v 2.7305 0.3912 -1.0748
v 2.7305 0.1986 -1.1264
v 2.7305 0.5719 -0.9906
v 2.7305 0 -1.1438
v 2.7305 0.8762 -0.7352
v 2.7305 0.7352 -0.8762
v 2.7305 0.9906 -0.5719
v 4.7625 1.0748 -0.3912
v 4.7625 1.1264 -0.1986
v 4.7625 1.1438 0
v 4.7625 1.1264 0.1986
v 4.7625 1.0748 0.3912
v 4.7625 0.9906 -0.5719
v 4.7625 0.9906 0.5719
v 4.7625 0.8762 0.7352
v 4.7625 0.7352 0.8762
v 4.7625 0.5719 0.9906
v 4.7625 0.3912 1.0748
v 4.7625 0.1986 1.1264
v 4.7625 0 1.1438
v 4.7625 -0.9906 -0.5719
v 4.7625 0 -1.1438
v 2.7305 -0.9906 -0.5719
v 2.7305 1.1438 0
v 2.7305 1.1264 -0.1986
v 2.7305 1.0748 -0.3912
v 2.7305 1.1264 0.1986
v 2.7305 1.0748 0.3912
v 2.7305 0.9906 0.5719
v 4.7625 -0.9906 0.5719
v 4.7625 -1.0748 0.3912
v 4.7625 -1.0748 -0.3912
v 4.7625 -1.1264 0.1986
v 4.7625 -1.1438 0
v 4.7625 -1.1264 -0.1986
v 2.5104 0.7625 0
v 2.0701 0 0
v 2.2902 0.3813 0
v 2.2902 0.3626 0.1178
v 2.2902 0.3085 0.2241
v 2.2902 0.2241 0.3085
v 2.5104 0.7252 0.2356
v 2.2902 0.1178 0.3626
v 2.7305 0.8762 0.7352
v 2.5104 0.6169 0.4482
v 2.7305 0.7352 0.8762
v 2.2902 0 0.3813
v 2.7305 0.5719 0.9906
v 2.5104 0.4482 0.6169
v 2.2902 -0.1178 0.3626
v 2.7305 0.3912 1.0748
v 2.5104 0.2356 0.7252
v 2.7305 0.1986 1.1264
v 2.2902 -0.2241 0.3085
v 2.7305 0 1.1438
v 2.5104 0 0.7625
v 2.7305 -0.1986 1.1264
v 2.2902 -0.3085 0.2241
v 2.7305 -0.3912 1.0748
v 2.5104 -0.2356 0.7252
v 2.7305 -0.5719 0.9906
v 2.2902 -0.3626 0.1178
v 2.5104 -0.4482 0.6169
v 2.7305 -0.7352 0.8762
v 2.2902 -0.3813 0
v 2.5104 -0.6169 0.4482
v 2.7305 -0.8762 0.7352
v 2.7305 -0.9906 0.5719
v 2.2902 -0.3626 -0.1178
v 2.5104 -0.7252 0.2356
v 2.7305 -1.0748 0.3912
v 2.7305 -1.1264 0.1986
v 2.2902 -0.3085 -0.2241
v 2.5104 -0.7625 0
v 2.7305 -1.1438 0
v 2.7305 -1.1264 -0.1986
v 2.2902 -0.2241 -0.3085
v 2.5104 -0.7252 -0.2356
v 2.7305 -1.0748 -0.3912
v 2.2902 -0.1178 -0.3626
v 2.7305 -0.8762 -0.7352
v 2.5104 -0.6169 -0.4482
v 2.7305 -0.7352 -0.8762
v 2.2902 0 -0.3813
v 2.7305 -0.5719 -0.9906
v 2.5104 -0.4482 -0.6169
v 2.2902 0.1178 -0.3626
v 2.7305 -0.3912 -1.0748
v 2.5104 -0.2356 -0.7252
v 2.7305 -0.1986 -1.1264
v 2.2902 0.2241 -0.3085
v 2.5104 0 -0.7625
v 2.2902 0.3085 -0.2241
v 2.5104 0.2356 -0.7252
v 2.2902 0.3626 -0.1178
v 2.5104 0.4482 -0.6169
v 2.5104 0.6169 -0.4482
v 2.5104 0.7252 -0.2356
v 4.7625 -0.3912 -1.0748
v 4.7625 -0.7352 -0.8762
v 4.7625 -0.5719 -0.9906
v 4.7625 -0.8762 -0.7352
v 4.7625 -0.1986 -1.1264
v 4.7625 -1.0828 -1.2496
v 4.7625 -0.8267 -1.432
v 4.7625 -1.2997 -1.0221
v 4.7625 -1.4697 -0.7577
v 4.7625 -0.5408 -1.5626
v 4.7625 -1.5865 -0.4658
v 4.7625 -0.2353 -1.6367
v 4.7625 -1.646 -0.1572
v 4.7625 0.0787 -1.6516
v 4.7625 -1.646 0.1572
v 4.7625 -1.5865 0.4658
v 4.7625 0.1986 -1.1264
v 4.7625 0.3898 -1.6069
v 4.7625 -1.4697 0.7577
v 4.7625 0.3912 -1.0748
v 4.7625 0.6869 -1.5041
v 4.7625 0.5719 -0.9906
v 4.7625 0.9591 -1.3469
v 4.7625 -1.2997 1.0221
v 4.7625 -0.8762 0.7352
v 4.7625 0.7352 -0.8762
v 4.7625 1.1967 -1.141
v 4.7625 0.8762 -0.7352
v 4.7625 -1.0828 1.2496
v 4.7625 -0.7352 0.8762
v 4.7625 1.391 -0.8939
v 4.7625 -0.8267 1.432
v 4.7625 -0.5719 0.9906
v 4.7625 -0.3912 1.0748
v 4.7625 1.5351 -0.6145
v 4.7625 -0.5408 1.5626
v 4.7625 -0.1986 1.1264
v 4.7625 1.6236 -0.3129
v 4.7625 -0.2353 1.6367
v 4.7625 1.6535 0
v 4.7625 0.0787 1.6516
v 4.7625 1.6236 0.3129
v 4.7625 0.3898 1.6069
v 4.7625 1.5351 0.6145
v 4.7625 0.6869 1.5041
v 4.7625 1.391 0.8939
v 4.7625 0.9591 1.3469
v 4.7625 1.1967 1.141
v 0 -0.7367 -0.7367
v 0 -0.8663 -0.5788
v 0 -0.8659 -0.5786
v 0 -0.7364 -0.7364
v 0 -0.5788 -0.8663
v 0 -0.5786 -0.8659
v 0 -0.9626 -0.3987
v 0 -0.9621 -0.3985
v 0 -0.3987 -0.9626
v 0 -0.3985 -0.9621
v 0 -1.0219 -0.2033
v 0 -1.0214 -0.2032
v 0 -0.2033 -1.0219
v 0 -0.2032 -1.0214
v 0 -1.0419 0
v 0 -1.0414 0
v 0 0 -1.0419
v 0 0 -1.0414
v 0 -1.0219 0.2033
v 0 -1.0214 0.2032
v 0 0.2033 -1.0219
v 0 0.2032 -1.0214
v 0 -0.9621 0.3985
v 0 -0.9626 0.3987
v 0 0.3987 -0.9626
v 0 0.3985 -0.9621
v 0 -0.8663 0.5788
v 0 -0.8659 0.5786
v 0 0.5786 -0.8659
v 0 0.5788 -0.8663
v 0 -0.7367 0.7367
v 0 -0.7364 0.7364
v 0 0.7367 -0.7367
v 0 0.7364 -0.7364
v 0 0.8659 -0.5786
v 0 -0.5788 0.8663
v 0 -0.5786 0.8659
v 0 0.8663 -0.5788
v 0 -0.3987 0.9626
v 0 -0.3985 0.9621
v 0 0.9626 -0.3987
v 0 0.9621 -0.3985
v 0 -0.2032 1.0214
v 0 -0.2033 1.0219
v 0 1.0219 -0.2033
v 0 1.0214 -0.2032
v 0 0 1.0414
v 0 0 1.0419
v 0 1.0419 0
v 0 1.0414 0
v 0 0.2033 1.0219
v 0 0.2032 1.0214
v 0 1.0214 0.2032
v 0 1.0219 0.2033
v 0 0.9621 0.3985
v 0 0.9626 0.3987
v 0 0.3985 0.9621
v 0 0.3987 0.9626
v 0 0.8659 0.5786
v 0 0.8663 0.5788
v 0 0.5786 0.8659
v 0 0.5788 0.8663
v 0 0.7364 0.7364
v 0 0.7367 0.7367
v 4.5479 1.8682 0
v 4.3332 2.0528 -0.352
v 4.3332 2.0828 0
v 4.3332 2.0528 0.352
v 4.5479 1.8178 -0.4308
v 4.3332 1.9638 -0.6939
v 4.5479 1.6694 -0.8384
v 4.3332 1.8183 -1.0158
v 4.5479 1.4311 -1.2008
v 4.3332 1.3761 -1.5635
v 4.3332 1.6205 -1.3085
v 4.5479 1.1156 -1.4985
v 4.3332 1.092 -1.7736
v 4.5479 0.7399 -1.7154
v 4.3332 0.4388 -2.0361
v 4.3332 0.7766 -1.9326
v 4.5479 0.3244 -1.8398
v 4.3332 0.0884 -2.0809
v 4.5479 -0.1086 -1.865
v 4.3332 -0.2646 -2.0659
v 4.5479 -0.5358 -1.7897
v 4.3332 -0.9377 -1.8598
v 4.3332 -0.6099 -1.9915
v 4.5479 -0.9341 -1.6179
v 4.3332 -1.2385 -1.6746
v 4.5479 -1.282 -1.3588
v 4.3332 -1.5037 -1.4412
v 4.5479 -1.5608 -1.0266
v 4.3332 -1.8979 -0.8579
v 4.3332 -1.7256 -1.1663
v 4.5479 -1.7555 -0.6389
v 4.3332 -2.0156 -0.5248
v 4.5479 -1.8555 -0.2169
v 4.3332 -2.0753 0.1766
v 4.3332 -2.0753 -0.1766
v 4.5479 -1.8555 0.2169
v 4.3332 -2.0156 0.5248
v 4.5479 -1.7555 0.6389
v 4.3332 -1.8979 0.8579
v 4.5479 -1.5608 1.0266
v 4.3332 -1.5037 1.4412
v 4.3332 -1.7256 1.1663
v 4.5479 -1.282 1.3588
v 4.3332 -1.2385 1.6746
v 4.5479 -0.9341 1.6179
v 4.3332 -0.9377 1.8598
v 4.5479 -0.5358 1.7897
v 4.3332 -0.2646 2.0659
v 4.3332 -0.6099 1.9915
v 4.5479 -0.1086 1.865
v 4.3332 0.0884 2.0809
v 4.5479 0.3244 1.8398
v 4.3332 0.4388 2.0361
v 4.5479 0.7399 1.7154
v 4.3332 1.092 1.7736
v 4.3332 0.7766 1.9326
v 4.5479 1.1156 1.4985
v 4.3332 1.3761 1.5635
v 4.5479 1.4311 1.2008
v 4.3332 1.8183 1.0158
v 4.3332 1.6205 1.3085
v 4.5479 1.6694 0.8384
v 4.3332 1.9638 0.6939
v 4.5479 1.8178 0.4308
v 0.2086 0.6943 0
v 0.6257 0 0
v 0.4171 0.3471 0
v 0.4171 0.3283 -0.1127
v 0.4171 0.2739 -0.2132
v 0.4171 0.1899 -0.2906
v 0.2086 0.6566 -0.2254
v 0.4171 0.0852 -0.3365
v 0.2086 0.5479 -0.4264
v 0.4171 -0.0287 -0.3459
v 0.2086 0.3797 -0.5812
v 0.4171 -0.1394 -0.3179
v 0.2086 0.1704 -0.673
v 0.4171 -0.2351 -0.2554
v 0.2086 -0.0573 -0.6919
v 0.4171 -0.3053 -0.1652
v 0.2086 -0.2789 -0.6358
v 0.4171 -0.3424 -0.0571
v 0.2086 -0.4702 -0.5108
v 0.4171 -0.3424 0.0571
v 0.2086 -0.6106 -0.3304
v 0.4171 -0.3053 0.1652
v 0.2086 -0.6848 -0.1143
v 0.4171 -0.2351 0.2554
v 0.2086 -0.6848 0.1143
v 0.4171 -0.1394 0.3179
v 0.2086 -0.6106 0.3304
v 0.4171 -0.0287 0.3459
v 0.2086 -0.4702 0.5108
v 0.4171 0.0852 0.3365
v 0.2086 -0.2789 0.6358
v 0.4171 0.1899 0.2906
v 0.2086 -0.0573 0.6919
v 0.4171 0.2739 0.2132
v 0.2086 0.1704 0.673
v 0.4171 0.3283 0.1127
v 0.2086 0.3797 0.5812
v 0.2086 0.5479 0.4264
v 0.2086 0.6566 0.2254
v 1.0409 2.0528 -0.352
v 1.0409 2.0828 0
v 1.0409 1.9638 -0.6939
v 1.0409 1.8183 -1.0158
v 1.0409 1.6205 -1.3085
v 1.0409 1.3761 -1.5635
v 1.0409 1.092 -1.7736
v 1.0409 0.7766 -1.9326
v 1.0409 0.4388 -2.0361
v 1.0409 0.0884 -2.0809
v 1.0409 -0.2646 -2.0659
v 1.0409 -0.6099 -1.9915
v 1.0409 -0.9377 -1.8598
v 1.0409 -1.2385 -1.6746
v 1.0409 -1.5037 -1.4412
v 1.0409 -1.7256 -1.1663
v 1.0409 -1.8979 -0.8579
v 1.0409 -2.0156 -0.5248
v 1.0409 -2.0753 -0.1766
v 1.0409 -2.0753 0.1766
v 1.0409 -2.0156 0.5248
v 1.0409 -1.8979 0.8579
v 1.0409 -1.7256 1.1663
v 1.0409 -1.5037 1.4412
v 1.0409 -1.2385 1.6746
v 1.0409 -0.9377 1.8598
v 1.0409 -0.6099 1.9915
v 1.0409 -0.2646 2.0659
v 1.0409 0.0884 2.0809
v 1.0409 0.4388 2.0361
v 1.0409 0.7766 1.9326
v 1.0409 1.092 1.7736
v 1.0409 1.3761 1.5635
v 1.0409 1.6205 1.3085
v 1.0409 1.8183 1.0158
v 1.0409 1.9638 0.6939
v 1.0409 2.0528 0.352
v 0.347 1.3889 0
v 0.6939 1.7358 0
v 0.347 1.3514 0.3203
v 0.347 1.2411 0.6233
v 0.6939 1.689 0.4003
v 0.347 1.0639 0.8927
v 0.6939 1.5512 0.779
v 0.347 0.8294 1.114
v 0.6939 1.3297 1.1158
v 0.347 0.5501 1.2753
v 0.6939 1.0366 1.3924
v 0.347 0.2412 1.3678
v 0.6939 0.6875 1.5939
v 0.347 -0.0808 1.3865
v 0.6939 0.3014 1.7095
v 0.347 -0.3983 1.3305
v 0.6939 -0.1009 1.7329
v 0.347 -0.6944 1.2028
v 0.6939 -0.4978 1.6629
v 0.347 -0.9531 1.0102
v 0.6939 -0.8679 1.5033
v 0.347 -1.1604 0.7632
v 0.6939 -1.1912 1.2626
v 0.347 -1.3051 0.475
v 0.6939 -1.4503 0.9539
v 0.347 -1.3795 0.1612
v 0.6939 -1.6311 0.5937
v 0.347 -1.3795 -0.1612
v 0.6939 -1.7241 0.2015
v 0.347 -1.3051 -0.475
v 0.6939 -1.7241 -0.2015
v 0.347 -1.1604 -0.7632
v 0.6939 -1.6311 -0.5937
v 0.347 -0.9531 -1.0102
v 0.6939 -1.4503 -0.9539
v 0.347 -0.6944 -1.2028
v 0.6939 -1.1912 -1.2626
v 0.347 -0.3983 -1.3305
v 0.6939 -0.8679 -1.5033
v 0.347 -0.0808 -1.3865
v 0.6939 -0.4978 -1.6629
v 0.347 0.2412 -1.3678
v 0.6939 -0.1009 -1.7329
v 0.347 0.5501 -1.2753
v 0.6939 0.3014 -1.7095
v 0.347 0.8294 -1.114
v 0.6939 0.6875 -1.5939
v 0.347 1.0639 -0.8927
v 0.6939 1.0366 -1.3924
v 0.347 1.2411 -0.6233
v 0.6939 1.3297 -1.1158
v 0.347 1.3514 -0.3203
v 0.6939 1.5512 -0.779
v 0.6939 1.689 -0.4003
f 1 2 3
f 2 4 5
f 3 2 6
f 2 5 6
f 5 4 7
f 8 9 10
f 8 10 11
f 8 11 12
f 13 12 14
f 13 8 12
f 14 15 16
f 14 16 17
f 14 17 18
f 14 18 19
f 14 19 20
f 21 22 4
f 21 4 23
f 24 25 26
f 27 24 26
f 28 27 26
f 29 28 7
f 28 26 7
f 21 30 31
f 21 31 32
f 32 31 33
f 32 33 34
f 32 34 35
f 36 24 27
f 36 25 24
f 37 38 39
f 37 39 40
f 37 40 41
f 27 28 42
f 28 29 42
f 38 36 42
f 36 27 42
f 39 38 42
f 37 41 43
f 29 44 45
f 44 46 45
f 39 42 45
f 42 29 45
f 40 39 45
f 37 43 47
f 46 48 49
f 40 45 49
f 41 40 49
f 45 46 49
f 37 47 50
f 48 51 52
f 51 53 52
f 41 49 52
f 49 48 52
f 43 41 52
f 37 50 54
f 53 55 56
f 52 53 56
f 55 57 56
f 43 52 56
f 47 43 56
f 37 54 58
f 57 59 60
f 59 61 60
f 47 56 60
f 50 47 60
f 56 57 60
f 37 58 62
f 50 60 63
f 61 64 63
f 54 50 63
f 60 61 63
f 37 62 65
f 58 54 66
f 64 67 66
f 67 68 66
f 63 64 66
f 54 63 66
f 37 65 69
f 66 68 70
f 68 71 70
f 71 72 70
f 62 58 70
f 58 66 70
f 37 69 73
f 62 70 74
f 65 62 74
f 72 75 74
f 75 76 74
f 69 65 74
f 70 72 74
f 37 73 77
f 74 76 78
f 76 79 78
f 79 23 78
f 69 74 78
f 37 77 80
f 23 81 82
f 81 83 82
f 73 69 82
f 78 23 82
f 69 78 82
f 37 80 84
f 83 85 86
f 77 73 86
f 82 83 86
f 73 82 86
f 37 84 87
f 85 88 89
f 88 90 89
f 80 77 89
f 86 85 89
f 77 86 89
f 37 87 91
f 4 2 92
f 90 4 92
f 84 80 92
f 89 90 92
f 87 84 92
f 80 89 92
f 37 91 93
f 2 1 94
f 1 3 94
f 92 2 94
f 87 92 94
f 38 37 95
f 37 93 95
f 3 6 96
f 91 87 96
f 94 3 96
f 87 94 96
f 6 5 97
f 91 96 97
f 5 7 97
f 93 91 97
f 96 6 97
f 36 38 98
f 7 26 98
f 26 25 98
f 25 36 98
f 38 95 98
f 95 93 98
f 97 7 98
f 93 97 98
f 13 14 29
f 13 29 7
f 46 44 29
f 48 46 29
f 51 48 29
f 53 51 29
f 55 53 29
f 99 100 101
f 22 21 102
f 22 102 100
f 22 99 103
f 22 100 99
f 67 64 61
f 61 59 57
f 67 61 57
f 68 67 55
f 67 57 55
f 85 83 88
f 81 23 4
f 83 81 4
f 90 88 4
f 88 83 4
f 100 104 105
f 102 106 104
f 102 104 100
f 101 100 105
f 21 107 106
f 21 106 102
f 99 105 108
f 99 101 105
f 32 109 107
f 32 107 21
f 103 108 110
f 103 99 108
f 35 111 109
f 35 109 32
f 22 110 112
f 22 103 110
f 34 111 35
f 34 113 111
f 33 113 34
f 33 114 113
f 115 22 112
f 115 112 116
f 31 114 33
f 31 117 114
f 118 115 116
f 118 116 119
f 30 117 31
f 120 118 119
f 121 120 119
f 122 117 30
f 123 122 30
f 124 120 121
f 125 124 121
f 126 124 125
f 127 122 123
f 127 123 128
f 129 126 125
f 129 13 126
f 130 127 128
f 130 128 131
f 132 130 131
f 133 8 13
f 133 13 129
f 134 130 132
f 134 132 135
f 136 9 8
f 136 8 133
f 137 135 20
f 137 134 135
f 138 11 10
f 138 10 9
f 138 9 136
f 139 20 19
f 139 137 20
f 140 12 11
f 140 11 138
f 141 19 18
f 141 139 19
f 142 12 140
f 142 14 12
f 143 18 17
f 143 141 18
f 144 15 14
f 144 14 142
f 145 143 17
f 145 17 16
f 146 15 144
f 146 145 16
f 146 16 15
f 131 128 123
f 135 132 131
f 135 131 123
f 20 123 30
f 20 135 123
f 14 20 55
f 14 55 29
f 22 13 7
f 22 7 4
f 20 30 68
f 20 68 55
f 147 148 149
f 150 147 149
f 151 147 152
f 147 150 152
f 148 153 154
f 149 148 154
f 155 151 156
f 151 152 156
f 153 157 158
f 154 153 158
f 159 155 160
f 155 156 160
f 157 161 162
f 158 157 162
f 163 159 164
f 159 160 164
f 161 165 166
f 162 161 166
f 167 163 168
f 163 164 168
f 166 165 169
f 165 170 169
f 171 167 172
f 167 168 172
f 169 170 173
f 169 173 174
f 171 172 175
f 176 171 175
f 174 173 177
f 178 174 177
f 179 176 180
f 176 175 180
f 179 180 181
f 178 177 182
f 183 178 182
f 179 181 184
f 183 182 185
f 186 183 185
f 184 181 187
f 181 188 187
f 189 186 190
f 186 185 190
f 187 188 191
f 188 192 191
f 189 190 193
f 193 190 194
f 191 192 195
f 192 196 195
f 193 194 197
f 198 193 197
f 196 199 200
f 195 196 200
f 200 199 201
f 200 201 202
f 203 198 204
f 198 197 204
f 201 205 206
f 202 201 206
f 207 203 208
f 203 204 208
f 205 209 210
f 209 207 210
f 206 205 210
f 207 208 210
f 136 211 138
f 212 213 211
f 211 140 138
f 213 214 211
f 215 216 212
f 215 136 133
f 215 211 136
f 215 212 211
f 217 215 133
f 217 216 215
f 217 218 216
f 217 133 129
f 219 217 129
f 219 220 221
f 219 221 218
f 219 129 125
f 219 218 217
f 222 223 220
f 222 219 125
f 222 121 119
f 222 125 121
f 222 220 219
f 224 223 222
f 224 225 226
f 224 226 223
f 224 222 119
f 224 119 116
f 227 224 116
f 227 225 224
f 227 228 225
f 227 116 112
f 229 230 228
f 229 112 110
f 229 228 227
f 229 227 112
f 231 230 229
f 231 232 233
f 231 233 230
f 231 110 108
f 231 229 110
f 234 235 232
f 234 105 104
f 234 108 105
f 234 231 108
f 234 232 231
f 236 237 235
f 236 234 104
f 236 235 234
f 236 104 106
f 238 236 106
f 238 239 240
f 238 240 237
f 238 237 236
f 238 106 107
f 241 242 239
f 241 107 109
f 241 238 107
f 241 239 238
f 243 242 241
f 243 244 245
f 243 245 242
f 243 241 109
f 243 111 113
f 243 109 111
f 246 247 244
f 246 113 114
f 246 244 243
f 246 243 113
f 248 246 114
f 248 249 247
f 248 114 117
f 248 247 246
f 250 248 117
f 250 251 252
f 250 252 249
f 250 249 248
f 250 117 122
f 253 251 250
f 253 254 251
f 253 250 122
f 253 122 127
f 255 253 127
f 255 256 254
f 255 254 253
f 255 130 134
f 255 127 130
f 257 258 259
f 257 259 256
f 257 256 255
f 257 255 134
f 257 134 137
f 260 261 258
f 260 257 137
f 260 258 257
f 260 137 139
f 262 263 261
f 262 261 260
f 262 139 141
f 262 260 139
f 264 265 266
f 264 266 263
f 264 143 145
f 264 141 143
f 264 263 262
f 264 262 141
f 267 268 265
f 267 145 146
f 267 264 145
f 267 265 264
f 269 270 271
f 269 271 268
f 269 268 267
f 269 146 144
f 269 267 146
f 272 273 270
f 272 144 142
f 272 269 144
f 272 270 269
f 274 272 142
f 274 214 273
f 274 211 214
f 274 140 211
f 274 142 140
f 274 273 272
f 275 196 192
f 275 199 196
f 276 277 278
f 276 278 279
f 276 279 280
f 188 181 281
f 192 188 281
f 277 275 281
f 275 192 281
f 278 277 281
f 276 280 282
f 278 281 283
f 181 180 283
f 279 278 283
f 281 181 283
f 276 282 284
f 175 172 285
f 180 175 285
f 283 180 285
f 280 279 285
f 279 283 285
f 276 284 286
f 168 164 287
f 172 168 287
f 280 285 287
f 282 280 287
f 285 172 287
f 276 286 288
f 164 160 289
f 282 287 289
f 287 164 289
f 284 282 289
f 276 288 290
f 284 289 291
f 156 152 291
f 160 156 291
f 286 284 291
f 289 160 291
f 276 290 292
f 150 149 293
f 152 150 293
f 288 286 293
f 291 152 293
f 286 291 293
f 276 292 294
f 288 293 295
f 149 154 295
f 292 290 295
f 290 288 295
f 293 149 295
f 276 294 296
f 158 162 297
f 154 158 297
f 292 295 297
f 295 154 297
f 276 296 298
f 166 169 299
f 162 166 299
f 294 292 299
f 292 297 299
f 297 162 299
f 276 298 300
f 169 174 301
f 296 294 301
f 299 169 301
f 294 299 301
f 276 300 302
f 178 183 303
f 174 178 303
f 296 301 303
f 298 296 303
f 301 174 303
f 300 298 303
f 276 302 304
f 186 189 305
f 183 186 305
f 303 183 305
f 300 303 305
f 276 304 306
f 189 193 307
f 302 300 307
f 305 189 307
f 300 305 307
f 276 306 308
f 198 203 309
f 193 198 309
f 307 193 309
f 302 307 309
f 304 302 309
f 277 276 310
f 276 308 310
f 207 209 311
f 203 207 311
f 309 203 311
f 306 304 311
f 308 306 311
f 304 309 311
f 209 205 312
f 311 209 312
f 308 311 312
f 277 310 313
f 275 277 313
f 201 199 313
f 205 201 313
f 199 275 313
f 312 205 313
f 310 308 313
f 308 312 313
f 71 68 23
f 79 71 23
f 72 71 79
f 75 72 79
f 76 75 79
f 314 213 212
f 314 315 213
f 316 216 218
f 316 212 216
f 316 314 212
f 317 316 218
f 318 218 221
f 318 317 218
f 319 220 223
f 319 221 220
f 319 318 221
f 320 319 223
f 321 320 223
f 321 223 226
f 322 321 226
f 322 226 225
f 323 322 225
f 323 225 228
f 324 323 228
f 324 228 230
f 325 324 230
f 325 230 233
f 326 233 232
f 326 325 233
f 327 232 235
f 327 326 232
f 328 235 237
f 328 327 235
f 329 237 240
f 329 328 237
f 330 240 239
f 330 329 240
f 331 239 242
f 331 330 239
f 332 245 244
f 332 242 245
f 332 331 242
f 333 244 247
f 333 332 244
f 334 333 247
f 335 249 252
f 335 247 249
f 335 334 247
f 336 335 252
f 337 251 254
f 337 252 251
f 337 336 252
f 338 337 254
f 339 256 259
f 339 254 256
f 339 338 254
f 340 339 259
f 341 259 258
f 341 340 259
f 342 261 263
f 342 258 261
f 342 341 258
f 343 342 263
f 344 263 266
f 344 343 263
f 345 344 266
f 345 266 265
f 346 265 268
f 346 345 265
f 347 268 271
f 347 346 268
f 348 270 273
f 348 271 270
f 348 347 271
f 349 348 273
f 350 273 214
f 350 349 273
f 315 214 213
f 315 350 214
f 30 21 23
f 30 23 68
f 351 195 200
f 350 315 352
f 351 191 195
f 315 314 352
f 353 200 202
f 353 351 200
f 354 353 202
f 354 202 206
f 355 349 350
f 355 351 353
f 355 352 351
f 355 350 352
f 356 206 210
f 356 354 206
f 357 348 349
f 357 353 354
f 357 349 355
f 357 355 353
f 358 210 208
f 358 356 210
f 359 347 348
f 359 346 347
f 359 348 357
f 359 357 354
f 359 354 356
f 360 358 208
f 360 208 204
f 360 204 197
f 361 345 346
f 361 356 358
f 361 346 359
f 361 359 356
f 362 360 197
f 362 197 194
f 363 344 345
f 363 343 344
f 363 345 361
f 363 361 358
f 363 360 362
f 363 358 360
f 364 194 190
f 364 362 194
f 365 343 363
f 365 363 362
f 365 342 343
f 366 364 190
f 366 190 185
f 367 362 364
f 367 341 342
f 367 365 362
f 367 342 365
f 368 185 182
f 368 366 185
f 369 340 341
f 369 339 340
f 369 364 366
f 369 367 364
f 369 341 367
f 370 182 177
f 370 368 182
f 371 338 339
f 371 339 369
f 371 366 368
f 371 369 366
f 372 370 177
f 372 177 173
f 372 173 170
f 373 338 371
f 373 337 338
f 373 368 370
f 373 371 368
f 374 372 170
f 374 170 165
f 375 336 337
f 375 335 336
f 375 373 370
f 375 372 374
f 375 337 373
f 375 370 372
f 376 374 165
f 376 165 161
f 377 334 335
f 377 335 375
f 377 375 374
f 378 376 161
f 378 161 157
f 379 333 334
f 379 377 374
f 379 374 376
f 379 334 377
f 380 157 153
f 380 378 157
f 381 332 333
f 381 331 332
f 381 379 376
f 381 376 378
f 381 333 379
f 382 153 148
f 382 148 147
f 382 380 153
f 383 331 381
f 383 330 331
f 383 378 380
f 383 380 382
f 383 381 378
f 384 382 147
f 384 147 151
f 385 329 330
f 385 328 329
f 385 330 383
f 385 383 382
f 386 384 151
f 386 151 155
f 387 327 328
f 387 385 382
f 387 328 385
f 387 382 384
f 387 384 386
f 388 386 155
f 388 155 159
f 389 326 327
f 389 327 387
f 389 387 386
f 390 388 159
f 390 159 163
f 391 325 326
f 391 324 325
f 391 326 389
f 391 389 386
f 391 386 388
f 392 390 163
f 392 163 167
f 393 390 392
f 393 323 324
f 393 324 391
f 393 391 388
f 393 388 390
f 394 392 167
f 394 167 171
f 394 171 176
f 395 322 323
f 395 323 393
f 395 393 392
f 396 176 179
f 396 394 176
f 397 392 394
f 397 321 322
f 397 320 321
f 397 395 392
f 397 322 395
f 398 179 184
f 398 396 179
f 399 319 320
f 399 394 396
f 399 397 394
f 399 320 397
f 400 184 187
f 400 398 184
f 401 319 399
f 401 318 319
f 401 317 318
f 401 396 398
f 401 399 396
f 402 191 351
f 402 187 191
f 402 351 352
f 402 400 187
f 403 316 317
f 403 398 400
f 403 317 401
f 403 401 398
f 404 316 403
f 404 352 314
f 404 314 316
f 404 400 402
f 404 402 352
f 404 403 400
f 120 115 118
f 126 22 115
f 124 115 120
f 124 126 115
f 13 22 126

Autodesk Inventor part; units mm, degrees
ref_plane "YZ Plane" through (0, 0, 0) normal (1, 0, 0) x (0, 1, 0)
ref_plane "XZ Plane" through (0, 0, 0) normal (0, 1, 0) x (-1, 0, 0)
sketch "Sketch1" plane through (0, 0, 0) normal (0, 0, 1) x (1, 0, 0)
  line L0 (0.6257, 0) -> (2.0701, 0)
  line L1 (4.7625, 1.1438) -> (4.7625, 2.0828)
  line L2 (4.7625, 2.0828) -> (0, 2.0828)
  line L3 (4.7625, 1.1438) -> (2.7305, 1.1438)
  line L4 (2.7305, 1.1438) -> (2.0701, 0)
  line L5 (0, 1.0414) -> (0.6257, 0)
  line L6 (0, -0.4166) -> (0, 2.4994) projected
  line L7 (0, 1.0414) -> (0, 2.0828)
  point P0 (0, 0)
  dimension "d0" = 2.032
  dimension "d1" = 60
  dimension "d2" = 4.1656
  dimension "d3" = 2.2877
  dimension "d4" = 4.7625
  dimension "d5" = 59
  dimension "d7" = 2.0828
revolve "Body" add sketch "Sketch1" angle 360 about axis through (0.6257, 0, 0) along (1, 0, 0)
sketch "Sketch2" plane through (4.7625, 0, 0) normal (1, 0, 0) x (0, 0, -1)
  circle A0 centre (0, 0) radius 1.1438 projected
  circle A1 centre (0, 0) radius 2.0828 projected
  line L0 (1.1438, 0) -> (0.5719, -0.9906)
  line L1 (0.5719, -0.9906) -> (-0.5719, -0.9906)
  line L2 (-0.5719, -0.9906) -> (-1.1438, 0)
  line L3 (-1.1438, 0) -> (-0.5719, 0.9906)
  line L4 (-0.5719, 0.9906) -> (0.5719, 0.9906)
  line L5 (0.5719, 0.9906) -> (1.1438, 0)
extrude "Slot" add sketch "Sketch2" against normal blind 2.032 contours L5 A0 | A0 L0 | L4 A0 | A0 L1 | L3 A0 | A0 L2
chamfer "Chamfer1" distance 1.0414 angle 45 1 edges at (0, -2.0828, 0) measured on face at (0, 1.7155, -0.1661)
thread "Thread" size "8-32 UNC" class "2A" standard "ANSI Unified Screw Threads" length 4.7625
chamfer "Chamfer2" distance 0.4293 angle 45 1 edges at (4.7625, -2.0828, 0) measured on face at (3.522, 2.0558, -0.3341)
ref_plane "Work Plane1" through (2.3813, 0, 0) normal (0, -0.5, -0.866) x (1, 0, 0)
equation "\"d0\" = INTI"
equation "\"d2\" = NND"
equation "\"d3\" = 1.1547 * SW"
equation "\"d4\" = NLG"
equation "\"d5\" = 0.5 * ANG"
equation "\"d7\" = SPD"
equation "\"d8\" = INTI"
equation "\"d10\" = -0.5 * SPD + 0.5 * NND"
equation "\"d11\" = FAWI"
equation "\"d33\" = -0.5 * SPD + 0.5 * NND"
equation "\"d14\" = NLG"
equation "\"d12\" = -0.5 * GD1 + 0.5 * NND"
equation "\"d13\" = FAWI"
equation "\"d34\" = -0.5 * GD1 + 0.5 * NND"
equation "\"NND\" = 4.1656"
equation "\"NLG\" = 4.7625"
equation "\"INTI\" = 2.032"
equation "\"FAWI\" = 45deg"
equation "\"SW\" = 1.9812"
equation "\"GD1\" = 3.30708"
equation "\"ANG\" = 118deg"
equation "\"FAWI1\" = FAWI"
equation "\"SPD\" = 2.0828"
equation "\"TOA\" = 30deg"
equation "\"THREADDIA\" = 4.1656"
equation "\"E0\" = 1.155 * SW"
properties part number "ANSI B18.3 - 8-32 UNC - 0.1875" material "Steel, Mild"
